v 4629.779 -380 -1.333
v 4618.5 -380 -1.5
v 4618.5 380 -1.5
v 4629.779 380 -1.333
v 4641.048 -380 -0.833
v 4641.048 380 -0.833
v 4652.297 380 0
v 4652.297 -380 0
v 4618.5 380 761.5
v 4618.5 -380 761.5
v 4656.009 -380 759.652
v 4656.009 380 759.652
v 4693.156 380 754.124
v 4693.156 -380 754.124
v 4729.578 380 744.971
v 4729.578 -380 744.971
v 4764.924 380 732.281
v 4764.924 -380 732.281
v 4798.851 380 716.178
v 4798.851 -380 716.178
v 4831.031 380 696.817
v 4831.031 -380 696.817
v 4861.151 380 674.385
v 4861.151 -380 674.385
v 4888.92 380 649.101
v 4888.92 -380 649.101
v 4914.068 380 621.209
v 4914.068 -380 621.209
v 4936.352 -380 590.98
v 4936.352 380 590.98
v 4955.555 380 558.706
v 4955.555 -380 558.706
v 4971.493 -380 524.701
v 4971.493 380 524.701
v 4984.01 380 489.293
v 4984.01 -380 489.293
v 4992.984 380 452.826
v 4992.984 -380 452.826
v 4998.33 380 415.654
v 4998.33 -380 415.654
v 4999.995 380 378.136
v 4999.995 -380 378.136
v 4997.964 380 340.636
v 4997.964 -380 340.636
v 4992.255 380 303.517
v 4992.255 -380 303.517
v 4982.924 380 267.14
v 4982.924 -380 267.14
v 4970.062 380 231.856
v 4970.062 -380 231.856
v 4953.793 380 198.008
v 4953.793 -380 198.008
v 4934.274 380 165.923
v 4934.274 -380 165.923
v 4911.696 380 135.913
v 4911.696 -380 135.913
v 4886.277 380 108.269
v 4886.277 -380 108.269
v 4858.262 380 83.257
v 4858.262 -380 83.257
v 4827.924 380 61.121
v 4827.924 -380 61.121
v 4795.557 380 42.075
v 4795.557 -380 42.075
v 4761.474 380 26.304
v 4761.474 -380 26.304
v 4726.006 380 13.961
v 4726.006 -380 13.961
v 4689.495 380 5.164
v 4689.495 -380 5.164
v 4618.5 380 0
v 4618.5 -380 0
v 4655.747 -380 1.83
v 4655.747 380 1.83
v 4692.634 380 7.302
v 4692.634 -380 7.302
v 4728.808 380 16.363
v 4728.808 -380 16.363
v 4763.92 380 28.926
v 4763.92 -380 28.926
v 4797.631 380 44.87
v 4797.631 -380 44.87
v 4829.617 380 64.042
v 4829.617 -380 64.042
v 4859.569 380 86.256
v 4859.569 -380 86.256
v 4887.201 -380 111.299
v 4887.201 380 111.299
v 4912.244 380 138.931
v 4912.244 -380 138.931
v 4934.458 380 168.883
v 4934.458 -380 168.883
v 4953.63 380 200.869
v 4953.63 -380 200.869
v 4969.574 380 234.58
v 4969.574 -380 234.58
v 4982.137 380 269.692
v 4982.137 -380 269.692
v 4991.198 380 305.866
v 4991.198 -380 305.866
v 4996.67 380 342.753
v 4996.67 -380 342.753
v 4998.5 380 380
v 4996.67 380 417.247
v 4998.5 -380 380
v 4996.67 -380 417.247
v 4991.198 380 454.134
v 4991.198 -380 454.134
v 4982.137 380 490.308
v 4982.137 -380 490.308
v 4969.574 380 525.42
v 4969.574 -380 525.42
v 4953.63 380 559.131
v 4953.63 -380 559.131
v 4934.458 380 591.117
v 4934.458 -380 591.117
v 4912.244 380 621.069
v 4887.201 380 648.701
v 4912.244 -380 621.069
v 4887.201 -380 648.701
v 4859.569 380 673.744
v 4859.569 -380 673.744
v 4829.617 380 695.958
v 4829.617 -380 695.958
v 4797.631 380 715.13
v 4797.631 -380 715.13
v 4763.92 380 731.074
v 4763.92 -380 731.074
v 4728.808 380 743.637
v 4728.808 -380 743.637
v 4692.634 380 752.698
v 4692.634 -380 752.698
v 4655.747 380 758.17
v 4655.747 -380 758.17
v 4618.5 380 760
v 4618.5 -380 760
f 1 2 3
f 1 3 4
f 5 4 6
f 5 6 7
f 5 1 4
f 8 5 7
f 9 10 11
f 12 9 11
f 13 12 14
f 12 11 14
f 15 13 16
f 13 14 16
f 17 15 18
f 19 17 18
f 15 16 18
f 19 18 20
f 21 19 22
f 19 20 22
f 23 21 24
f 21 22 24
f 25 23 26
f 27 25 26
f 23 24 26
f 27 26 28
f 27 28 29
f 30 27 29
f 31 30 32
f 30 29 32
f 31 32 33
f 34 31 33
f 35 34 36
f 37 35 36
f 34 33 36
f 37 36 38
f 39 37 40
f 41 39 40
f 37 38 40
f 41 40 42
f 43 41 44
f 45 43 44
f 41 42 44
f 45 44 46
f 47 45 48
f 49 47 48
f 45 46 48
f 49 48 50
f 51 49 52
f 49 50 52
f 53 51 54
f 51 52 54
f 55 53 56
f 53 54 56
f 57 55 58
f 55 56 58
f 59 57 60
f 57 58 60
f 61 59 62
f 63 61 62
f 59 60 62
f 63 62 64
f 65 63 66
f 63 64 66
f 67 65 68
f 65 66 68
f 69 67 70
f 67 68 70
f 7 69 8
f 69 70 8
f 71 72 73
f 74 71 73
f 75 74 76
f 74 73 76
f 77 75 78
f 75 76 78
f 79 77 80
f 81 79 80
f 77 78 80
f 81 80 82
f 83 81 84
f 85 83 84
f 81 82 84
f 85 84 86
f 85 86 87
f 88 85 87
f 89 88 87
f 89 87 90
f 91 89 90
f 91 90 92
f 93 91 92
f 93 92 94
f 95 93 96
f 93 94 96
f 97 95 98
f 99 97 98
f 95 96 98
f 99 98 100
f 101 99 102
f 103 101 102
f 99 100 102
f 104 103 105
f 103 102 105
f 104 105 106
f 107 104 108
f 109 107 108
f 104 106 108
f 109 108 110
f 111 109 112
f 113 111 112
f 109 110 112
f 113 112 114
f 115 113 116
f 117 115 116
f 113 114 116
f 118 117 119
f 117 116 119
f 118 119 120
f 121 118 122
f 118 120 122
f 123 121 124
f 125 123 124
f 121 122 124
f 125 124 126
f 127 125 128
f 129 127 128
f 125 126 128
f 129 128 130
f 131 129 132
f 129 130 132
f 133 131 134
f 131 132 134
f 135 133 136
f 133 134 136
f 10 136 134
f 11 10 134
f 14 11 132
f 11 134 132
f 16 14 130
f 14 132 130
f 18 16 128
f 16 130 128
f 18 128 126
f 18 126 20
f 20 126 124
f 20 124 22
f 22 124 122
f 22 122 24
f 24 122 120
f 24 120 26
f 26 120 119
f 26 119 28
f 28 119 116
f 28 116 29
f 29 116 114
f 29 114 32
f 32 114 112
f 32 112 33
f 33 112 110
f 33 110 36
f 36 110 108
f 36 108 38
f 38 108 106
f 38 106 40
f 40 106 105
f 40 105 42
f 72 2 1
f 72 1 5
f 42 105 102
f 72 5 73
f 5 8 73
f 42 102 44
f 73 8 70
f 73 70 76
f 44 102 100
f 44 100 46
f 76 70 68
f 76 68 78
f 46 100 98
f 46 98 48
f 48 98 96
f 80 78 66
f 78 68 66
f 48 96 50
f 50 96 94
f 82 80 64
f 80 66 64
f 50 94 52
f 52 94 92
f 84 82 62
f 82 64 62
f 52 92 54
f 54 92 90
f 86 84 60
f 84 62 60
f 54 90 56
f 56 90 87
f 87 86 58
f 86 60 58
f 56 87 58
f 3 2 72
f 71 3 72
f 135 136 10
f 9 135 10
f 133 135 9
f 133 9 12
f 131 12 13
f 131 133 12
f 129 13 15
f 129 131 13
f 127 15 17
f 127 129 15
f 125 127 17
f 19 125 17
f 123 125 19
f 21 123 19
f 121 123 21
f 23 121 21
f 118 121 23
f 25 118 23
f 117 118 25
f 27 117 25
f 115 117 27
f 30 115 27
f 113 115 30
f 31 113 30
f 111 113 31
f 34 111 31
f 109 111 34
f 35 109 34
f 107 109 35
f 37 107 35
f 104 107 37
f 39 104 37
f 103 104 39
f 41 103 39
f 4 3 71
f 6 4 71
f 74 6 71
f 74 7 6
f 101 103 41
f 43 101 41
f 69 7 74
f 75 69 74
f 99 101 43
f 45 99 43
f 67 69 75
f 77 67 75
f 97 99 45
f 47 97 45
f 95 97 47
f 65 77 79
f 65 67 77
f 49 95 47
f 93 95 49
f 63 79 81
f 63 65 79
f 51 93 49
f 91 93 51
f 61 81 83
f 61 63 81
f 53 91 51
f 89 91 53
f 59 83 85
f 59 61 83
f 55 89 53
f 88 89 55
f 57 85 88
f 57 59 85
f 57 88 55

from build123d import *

# Parameters (mm, degrees)
SKETCH1_W          = 10000
SKETCH1_H          = 760
BASE_FLANGE1_DEPTH = 1.5
HEM2_START         = -380
HEM2_DEPTH         = 760
HEM2_2_DEPTH       = 760
SKETCH17_W         = 11222.895029189
SKETCH17_H         = 1018.315302658
CUT_EXTRUDE2_DEPTH = 5115.438605556


# Read off the part's stored shape, not the designer's step: Hem2
# Sheet-metal steps are written as plain solids
with BuildPart() as part:
    # Sketch1 → Base-Flange1 (new body)
    with BuildSketch(Plane.XY):
        Rectangle(SKETCH1_W, SKETCH1_H)
    extrude(amount=-BASE_FLANGE1_DEPTH)

    # Hem2 outline → Hem2 (cut)
    with BuildSketch(Plane(origin=(0, 0, 0), x_dir=(1, 0, 0), z_dir=(0, 1, 0)).offset(HEM2_START)):
        with BuildLine():
            ThreePointArc((4618.5, 1.5), (4635.415229824, 1.124815513), (4652.297189232, 0))
            Line((4652.297189232, 0), (5000, 0))
            Line((5000, 0), (5000, 1.5))
            Line((5000, 1.5), (4618.5, 1.5))
        make_face()
    extrude(amount=HEM2_DEPTH, mode=Mode.SUBTRACT)

    # Hem2 2 outline → Hem2 2 (add)
    with BuildSketch(Plane(origin=(0, 0, 0), x_dir=(1, 0, 0), z_dir=(0, 1, 0)).offset(HEM2_START)):
        with BuildLine():
            Line((4618.5, -760), (4618.5, -761.5))
            ThreePointArc((4618.5, -761.5), (4999.624815513, -396.915229824), (4652.297189232, 0))
            Line((4652.297189232, 0), (4618.5, 0))
            ThreePointArc((4618.5, 0), (4998.5, -380), (4618.5, -760))
        make_face()
    extrude(amount=HEM2_2_DEPTH)

    # Sketch17 → Cut-Extrude2 (cut, through all)
    with BuildSketch(Plane.XZ.offset(380)):
        with Locations((-992.947514595, -509.157651329)):
            Rectangle(SKETCH17_W, SKETCH17_H)
    extrude(amount=-CUT_EXTRUDE2_DEPTH, mode=Mode.SUBTRACT)


solid = part.part
